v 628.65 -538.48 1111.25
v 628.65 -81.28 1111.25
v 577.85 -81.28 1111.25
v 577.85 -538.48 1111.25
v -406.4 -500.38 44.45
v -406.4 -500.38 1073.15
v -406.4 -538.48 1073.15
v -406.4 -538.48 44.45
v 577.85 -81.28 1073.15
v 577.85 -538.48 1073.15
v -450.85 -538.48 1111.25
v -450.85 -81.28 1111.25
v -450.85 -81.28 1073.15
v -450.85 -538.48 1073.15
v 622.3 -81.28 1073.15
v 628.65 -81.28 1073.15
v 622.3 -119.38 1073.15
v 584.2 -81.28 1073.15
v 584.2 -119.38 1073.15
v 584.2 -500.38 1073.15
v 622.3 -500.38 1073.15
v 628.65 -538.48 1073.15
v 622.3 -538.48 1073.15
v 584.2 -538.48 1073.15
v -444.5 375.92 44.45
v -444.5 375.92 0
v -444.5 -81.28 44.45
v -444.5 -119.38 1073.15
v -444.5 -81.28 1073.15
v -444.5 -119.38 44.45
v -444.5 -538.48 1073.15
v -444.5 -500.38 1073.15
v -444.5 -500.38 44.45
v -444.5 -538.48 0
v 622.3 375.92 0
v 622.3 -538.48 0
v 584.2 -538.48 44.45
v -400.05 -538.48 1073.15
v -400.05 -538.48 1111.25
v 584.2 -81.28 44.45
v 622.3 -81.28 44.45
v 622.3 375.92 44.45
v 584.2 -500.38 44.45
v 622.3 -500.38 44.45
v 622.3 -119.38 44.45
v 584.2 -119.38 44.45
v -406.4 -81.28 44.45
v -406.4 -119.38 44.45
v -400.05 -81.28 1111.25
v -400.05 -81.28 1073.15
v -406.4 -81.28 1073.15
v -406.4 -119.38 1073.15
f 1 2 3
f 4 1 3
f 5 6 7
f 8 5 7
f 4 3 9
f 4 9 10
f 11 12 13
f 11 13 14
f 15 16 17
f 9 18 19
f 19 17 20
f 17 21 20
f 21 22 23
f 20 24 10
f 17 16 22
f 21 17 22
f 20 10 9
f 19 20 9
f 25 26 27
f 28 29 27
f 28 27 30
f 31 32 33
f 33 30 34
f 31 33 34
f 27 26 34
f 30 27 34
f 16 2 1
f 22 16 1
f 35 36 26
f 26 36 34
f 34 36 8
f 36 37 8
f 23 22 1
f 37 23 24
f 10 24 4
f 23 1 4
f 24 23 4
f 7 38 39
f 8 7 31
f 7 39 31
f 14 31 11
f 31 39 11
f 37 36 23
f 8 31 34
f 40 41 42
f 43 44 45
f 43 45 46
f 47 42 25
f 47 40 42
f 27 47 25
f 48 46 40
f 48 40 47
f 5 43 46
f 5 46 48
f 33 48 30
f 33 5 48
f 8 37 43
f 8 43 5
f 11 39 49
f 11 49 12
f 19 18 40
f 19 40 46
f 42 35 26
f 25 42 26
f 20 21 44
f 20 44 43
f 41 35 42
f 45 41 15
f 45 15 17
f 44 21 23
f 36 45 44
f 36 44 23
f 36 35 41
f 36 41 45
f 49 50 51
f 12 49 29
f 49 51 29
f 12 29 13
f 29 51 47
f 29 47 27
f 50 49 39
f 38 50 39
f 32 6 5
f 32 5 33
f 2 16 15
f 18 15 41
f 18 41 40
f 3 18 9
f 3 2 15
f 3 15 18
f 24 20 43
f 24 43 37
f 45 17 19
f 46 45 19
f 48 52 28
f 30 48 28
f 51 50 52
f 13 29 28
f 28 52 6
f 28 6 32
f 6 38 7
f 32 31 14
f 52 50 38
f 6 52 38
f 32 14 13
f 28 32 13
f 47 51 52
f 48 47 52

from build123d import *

# Parameters (mm, degrees)
F0_W     = 533.4
F0_H     = 457.2
F1_DEPTH = 44.45
F2_W     = 38.1
F2_H     = 38.1
F3_DEPTH = 1066.8
F4_W     = 50.8
F4_H     = 457.2
F5_DEPTH = 38.1
F6_ANGLE = 180


with BuildPart() as f1:
    # F0 (on Top) → F1 (new body)
    with BuildSketch(Plane.XY):
        with Locations((-266.7, 228.6)):
            Rectangle(F0_W, F0_H)
        with Locations((266.7, 228.6)):
            Rectangle(F0_W, F0_H)
        with Locations((-266.7, -228.6)):
            Rectangle(F0_W, F0_H)
        with Locations((266.7, -228.6)):
            Rectangle(F0_W, F0_H)
    extrude(amount=F1_DEPTH)

    # F2 (on face) → F3 (join)
    with BuildSketch(Plane.XY.offset(44.45)):
        with Locations((-514.35, 438.15)):
            Rectangle(F2_W, F2_H)
        with Locations((514.35, 438.15)):
            Rectangle(F2_W, F2_H)
        with Locations((-514.35, 19.05)):
            Rectangle(F2_W, F2_H)
        with Locations((514.35, 19.05)):
            Rectangle(F2_W, F2_H)
    extrude(amount=F3_DEPTH)

    # F4 (on face) → F5 (join)
    with BuildSketch(Plane.XY.offset(1111.25)):
        with Locations((-514.35, 228.6)):
            Rectangle(F4_W, F4_H)
        with Locations((514.35, 228.6)):
            Rectangle(F4_W, F4_H)
    extrude(amount=-F5_DEPTH)


with BuildPart() as f1_1:
    # F6: moved
    add(f1.part.rotate(Axis((-533.4, -457.2, 22.225), (0, 0, 1)), F6_ANGLE))


with BuildPart() as f1_2:
    # F7: moved
    add(f1_1.part.moved(Location((1155.7, 833.12, 0))))


solid = f1_2.part
